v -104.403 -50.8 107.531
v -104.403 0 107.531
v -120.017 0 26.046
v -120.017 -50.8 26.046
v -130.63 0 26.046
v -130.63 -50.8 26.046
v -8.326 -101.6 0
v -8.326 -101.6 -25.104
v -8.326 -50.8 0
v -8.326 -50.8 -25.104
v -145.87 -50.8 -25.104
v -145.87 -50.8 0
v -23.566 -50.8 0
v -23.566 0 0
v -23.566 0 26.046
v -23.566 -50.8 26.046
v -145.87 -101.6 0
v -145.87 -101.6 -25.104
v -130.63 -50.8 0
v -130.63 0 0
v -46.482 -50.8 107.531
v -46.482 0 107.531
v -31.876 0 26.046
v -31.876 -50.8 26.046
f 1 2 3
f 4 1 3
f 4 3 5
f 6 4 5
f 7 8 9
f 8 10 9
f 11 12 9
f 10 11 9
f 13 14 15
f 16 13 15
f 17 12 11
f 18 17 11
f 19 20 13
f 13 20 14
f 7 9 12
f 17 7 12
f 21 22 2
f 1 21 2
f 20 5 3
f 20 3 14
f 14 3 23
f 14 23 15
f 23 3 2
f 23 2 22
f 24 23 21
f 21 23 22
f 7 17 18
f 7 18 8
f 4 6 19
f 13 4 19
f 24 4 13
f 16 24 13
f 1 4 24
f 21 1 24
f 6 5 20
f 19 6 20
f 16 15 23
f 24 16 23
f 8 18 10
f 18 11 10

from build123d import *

# Parameters (mm, degrees)
F1_DEPTH = 50.8
F3_DEPTH = 25.4
F5_DEPTH = 25.4


with BuildPart() as f1:
    # F0 (on Front) → F1 (new body)
    with BuildSketch(Plane.XZ):
        Polygon((-120.0167089701, 26.0464213789), (-130.6295543909, 26.0464213789), (-130.6295543909, 0), (-23.5658083111, 0), (-23.5658083111, 26.0464213789), (-31.8762026727, 26.0464213789), align=None)
        Polygon((-104.4032499194, 107.5314208865), (-120.0167089701, 26.0464213789), (-31.8762026727, 26.0464213789), (-46.4823432267, 107.5314208865), align=None)
    extrude(amount=F1_DEPTH)


with BuildPart() as f3:
    # F2 (on face) → F3 (new body)
    with BuildSketch(Plane.XZ.offset(50.8)):
        Polygon((-23.5658083111, 0), (-130.6295543909, 0), (-145.8695543909, 0), (-145.8695543909, -25.1038316637), (-8.3258083111, -25.1038316637), (-8.3258083111, 0), align=None)
    extrude(amount=F3_DEPTH)

    # F5 (add): a face of the model
    f5_faces = [f3.faces().sort_by_distance(p)[0] for p in [
        (-77.097681351, -76.2, -12.5519158319),
    ]]
    extrude(f5_faces, amount=F5_DEPTH)


solid = Compound([f1.part, f3.part])
